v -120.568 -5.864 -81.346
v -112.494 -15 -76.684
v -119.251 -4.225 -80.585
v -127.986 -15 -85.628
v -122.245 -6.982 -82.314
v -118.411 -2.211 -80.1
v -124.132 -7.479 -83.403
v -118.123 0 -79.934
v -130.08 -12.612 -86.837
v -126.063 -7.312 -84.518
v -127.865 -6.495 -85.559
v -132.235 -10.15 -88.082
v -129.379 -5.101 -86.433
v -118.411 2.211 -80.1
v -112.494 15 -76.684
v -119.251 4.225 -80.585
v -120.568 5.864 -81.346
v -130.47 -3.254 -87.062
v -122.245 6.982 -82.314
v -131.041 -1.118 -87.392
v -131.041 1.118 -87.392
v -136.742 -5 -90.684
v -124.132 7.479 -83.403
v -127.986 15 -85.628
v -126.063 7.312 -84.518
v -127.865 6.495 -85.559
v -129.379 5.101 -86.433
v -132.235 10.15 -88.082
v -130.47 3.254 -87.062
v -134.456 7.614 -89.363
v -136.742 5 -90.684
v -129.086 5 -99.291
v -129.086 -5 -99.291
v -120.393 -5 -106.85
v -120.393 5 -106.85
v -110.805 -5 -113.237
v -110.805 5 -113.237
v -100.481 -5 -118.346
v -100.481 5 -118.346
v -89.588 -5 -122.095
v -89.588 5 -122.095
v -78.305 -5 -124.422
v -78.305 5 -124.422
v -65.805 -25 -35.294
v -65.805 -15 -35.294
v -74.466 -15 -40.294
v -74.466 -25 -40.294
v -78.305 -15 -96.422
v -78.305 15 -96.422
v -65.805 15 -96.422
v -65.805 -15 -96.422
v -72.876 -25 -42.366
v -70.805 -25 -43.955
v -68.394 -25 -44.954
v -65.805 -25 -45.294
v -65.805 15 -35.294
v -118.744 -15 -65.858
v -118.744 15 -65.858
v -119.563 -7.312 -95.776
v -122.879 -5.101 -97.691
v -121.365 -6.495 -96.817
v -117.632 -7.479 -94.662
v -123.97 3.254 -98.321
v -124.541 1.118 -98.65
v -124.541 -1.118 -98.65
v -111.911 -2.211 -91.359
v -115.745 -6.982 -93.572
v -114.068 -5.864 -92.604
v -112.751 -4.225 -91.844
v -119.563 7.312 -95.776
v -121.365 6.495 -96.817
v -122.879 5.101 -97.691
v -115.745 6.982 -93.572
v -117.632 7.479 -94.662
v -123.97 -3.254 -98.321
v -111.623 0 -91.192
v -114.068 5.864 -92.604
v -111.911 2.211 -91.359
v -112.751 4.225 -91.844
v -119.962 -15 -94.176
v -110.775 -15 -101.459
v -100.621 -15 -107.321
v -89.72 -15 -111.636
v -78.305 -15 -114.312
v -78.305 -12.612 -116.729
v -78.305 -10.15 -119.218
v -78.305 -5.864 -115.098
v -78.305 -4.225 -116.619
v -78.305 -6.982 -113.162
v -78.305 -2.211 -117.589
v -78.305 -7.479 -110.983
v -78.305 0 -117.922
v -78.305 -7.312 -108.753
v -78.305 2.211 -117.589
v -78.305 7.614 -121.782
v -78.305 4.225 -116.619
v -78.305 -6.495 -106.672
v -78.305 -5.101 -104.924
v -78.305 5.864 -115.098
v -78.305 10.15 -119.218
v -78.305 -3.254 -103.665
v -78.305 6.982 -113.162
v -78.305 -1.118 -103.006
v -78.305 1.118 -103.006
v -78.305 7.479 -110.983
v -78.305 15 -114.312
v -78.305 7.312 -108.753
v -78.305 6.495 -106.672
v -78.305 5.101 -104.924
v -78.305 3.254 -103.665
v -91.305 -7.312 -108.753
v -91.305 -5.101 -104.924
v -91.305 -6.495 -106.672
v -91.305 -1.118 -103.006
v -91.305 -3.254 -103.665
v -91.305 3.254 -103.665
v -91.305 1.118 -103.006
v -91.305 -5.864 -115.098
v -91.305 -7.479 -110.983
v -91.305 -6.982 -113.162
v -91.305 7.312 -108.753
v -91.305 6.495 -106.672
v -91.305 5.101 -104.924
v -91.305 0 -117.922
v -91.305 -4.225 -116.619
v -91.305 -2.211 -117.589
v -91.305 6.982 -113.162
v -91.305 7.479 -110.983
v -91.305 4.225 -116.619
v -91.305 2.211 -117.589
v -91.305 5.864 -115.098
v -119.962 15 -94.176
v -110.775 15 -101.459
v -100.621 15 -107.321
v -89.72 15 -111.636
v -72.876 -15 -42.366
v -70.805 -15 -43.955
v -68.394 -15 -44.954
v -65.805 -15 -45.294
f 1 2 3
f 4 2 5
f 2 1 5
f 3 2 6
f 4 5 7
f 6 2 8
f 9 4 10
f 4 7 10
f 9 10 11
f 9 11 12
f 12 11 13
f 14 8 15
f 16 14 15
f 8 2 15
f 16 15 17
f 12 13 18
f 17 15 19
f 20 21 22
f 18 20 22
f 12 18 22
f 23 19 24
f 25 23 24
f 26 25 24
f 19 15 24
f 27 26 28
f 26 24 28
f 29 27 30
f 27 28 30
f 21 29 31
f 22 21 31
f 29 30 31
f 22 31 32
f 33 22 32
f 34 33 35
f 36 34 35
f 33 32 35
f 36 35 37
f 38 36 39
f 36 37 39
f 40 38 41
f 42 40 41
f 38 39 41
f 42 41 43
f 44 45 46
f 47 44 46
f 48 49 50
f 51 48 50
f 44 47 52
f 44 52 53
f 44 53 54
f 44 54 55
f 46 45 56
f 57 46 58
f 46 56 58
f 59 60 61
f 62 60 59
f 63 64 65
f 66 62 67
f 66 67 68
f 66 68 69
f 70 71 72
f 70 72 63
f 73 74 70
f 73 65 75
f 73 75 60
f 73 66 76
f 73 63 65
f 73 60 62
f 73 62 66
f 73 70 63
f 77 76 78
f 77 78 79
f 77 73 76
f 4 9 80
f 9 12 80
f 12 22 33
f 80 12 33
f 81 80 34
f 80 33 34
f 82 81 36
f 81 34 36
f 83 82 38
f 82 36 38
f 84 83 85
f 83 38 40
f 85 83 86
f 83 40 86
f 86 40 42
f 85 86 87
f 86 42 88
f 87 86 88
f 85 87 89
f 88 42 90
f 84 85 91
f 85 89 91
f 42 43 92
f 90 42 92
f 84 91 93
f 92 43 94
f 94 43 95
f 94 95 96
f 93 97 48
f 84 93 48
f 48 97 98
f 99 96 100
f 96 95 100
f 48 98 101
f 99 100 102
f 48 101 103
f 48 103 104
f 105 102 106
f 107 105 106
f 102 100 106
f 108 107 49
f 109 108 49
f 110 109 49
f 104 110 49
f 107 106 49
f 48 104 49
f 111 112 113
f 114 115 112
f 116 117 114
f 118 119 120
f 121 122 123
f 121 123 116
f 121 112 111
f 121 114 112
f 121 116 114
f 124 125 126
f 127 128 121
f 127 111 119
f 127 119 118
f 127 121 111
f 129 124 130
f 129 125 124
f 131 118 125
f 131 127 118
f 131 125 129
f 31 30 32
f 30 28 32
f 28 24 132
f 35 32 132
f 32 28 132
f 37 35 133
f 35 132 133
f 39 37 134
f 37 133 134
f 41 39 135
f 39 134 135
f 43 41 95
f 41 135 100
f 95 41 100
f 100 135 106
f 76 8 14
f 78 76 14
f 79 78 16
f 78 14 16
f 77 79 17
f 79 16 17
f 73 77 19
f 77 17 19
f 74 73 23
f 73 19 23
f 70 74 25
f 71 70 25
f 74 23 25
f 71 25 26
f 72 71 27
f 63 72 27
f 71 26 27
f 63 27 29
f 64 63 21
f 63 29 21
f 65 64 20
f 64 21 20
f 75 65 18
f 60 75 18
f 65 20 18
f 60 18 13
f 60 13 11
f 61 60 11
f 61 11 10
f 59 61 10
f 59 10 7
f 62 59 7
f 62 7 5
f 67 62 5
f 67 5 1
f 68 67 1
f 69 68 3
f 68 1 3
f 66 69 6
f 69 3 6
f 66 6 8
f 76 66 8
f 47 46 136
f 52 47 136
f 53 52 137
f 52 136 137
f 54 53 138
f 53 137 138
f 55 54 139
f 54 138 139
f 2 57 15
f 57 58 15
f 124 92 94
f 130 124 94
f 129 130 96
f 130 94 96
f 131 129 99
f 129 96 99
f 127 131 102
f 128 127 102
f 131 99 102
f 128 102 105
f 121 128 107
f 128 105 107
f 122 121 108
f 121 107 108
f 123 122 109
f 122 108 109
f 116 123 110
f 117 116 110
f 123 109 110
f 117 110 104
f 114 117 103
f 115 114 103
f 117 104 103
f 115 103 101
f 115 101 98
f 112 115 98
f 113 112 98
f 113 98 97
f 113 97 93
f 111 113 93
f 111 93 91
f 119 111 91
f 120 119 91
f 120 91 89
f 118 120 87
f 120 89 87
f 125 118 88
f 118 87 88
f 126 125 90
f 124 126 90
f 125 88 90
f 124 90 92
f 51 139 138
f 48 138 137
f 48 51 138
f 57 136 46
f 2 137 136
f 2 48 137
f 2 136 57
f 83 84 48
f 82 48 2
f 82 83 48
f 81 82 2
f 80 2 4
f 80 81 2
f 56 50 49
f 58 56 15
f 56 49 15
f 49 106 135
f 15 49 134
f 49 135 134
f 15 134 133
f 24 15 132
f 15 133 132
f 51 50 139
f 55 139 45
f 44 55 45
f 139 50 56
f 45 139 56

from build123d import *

# Parameters (mm, degrees)
SALIENTE_EXTRUIR1_DEPTH = 15
CORTAR_EXTRUIR2_DEPTH   = 30
CROQUIS4_R              = 7.5
CORTAR_EXTRUIR3_DEPTH   = 13
CROQUIS5_R              = 7.5
CORTAR_EXTRUIR4_DEPTH   = 13
SALIENTE_EXTRUIR2_DEPTH = 10
CHAFL_N1_SIZE           = 10
CHAFL_N2_SIZE           = 10


with BuildPart() as part:
    # Croquis1 → Saliente-Extruir1 (new, symmetric)
    with BuildSketch(Plane(origin=(0, 0, 0), x_dir=(1, 0, 0), z_dir=(0, 1, 0))):
        with BuildLine():
            Line((-136.742226614, -20.094724465), (-112.493515308, -6.094724465))
            Line((-112.493515308, -6.094724465), (-118.743515308, 4.730593082))
            Line((-118.743515308, 4.730593082), (-124.993515308, 15.55591063))
            Line((-124.993515308, 15.55591063), (-149.242226614, 1.55591063))
            ThreePointArc((-149.242226614, 1.55591063), (-155.805359207, 35.294451757), (-149.242226614, 69.032992885))
            Line((-149.242226614, 69.032992885), (-124.993515308, 55.032992885))
            Line((-124.993515308, 55.032992885), (-118.743515308, 65.858310432))
            Line((-118.743515308, 65.858310432), (-112.493515308, 76.68362798))
            Line((-112.493515308, 76.68362798), (-136.742226614, 90.68362798))
            ThreePointArc((-136.742226614, 90.68362798), (-110.805359207, 113.236738098), (-78.305359207, 124.422169107))
            Line((-78.305359207, 124.422169107), (-78.305359207, 96.422169107))
            Line((-78.305359207, 96.422169107), (-65.805359207, 96.422169107))
            Line((-65.805359207, 96.422169107), (-53.305359207, 96.422169107))
            Line((-53.305359207, 96.422169107), (-53.305359207, 124.422169107))
            ThreePointArc((-53.305359207, 124.422169107), (-20.805359207, 113.236738098), (5.131508199, 90.68362798))
            Line((5.131508199, 90.68362798), (-19.117203107, 76.68362798))
            Line((-19.117203107, 76.68362798), (-6.617203107, 55.032992885))
            Line((-6.617203107, 55.032992885), (17.631508199, 69.032992885))
            ThreePointArc((17.631508199, 69.032992885), (24.194640793, 35.294451757), (17.631508199, 1.55591063))
            Line((17.631508199, 1.55591063), (-6.617203107, 15.55591063))
            Line((-6.617203107, 15.55591063), (-12.867203107, 4.730593082))
            Line((-12.867203107, 4.730593082), (-19.117203107, -6.094724465))
            Line((-19.117203107, -6.094724465), (5.131508199, -20.094724465))
            ThreePointArc((5.131508199, -20.094724465), (-20.805359207, -42.647834583), (-53.305359207, -53.833265593))
            Line((-53.305359207, -53.833265593), (-53.305359207, -25.833265593))
            Line((-53.305359207, -25.833265593), (-65.805359207, -25.833265593))
            Line((-65.805359207, -25.833265593), (-78.305359207, -25.833265593))
            Line((-78.305359207, -25.833265593), (-78.305359207, -53.833265593))
            ThreePointArc((-78.305359207, -53.833265593), (-110.805359207, -42.647834583), (-136.742226614, -20.094724465))
        make_face()
    extrude(amount=SALIENTE_EXTRUIR1_DEPTH, both=True)

    # Croquis3 → Cortar-Extruir2 (cut)
    with BuildSketch(Plane(origin=(0, 15, 0), x_dir=(1, 0, 0), z_dir=(0, 1, 0))):
        with BuildLine():
            Line((-65.805359207, 96.422169107), (-65.805359207, 35.294451757))
            Line((-65.805359207, 35.294451757), (-118.743515308, 65.858310432))
            Line((-118.743515308, 65.858310432), (-112.493515308, 76.68362798))
            Line((-112.493515308, 76.68362798), (-136.742226614, 90.68362798))
            ThreePointArc((-136.742226614, 90.68362798), (-20.805359207, -42.647834583), (-78.305359207, 124.422169107))
            Line((-78.305359207, 124.422169107), (-78.305359207, 96.422169107))
            Line((-78.305359207, 96.422169107), (-65.805359207, 96.422169107))
        make_face()
    extrude(amount=-CORTAR_EXTRUIR2_DEPTH, mode=Mode.SUBTRACT)

    # Croquis4 → Cortar-Extruir3 (cut)
    with BuildSketch(Plane(origin=(-78.305359207, 0, 0), x_dir=(0, 0, -1), z_dir=(1, 0, 0))):
        with Locations((110.422169107, 0)):
            Circle(CROQUIS4_R)
    extrude(amount=-CORTAR_EXTRUIR3_DEPTH, mode=Mode.SUBTRACT)

    # Croquis5 → Cortar-Extruir4 (cut)
    with BuildSketch(Plane(origin=(5.081606115, 0, -8.801599976), x_dir=(0.8660254037844403, 0, 0.4999999999999971), z_dir=(-0.49999999999999717, 0, 0.8660254037844404))):
        with Locations((-149.764056007, 0)):
            Circle(CROQUIS5_R)
    extrude(amount=-CORTAR_EXTRUIR4_DEPTH, mode=Mode.SUBTRACT)

    # Croquis6 → Saliente-Extruir2 (add)
    with BuildSketch(Plane.XZ.offset(15)):
        with BuildLine():
            Line((-65.805359207, -35.294451757), (-74.465613245, -40.294451757))
            ThreePointArc((-74.465613245, -40.294451757), (-70.805359207, -43.954705795), (-65.805359207, -45.294451757))
            Line((-65.805359207, -45.294451757), (-65.805359207, -35.294451757))
        make_face()
    extrude(amount=SALIENTE_EXTRUIR2_DEPTH)

    # Chaflán1
    chafl_n1_edges = [part.edges().sort_by_distance(p)[0] for p in [
        (-110.805359207, -15, -113.236738098),
    ]]
    chamfer(chafl_n1_edges, length=CHAFL_N1_SIZE)

    # Chaflán2
    chafl_n2_edges = [part.edges().sort_by_distance(p)[0] for p in [
        (-110.805359207, 15, -113.236738098),
    ]]
    chamfer(chafl_n2_edges, length=CHAFL_N2_SIZE)


solid = part.part
